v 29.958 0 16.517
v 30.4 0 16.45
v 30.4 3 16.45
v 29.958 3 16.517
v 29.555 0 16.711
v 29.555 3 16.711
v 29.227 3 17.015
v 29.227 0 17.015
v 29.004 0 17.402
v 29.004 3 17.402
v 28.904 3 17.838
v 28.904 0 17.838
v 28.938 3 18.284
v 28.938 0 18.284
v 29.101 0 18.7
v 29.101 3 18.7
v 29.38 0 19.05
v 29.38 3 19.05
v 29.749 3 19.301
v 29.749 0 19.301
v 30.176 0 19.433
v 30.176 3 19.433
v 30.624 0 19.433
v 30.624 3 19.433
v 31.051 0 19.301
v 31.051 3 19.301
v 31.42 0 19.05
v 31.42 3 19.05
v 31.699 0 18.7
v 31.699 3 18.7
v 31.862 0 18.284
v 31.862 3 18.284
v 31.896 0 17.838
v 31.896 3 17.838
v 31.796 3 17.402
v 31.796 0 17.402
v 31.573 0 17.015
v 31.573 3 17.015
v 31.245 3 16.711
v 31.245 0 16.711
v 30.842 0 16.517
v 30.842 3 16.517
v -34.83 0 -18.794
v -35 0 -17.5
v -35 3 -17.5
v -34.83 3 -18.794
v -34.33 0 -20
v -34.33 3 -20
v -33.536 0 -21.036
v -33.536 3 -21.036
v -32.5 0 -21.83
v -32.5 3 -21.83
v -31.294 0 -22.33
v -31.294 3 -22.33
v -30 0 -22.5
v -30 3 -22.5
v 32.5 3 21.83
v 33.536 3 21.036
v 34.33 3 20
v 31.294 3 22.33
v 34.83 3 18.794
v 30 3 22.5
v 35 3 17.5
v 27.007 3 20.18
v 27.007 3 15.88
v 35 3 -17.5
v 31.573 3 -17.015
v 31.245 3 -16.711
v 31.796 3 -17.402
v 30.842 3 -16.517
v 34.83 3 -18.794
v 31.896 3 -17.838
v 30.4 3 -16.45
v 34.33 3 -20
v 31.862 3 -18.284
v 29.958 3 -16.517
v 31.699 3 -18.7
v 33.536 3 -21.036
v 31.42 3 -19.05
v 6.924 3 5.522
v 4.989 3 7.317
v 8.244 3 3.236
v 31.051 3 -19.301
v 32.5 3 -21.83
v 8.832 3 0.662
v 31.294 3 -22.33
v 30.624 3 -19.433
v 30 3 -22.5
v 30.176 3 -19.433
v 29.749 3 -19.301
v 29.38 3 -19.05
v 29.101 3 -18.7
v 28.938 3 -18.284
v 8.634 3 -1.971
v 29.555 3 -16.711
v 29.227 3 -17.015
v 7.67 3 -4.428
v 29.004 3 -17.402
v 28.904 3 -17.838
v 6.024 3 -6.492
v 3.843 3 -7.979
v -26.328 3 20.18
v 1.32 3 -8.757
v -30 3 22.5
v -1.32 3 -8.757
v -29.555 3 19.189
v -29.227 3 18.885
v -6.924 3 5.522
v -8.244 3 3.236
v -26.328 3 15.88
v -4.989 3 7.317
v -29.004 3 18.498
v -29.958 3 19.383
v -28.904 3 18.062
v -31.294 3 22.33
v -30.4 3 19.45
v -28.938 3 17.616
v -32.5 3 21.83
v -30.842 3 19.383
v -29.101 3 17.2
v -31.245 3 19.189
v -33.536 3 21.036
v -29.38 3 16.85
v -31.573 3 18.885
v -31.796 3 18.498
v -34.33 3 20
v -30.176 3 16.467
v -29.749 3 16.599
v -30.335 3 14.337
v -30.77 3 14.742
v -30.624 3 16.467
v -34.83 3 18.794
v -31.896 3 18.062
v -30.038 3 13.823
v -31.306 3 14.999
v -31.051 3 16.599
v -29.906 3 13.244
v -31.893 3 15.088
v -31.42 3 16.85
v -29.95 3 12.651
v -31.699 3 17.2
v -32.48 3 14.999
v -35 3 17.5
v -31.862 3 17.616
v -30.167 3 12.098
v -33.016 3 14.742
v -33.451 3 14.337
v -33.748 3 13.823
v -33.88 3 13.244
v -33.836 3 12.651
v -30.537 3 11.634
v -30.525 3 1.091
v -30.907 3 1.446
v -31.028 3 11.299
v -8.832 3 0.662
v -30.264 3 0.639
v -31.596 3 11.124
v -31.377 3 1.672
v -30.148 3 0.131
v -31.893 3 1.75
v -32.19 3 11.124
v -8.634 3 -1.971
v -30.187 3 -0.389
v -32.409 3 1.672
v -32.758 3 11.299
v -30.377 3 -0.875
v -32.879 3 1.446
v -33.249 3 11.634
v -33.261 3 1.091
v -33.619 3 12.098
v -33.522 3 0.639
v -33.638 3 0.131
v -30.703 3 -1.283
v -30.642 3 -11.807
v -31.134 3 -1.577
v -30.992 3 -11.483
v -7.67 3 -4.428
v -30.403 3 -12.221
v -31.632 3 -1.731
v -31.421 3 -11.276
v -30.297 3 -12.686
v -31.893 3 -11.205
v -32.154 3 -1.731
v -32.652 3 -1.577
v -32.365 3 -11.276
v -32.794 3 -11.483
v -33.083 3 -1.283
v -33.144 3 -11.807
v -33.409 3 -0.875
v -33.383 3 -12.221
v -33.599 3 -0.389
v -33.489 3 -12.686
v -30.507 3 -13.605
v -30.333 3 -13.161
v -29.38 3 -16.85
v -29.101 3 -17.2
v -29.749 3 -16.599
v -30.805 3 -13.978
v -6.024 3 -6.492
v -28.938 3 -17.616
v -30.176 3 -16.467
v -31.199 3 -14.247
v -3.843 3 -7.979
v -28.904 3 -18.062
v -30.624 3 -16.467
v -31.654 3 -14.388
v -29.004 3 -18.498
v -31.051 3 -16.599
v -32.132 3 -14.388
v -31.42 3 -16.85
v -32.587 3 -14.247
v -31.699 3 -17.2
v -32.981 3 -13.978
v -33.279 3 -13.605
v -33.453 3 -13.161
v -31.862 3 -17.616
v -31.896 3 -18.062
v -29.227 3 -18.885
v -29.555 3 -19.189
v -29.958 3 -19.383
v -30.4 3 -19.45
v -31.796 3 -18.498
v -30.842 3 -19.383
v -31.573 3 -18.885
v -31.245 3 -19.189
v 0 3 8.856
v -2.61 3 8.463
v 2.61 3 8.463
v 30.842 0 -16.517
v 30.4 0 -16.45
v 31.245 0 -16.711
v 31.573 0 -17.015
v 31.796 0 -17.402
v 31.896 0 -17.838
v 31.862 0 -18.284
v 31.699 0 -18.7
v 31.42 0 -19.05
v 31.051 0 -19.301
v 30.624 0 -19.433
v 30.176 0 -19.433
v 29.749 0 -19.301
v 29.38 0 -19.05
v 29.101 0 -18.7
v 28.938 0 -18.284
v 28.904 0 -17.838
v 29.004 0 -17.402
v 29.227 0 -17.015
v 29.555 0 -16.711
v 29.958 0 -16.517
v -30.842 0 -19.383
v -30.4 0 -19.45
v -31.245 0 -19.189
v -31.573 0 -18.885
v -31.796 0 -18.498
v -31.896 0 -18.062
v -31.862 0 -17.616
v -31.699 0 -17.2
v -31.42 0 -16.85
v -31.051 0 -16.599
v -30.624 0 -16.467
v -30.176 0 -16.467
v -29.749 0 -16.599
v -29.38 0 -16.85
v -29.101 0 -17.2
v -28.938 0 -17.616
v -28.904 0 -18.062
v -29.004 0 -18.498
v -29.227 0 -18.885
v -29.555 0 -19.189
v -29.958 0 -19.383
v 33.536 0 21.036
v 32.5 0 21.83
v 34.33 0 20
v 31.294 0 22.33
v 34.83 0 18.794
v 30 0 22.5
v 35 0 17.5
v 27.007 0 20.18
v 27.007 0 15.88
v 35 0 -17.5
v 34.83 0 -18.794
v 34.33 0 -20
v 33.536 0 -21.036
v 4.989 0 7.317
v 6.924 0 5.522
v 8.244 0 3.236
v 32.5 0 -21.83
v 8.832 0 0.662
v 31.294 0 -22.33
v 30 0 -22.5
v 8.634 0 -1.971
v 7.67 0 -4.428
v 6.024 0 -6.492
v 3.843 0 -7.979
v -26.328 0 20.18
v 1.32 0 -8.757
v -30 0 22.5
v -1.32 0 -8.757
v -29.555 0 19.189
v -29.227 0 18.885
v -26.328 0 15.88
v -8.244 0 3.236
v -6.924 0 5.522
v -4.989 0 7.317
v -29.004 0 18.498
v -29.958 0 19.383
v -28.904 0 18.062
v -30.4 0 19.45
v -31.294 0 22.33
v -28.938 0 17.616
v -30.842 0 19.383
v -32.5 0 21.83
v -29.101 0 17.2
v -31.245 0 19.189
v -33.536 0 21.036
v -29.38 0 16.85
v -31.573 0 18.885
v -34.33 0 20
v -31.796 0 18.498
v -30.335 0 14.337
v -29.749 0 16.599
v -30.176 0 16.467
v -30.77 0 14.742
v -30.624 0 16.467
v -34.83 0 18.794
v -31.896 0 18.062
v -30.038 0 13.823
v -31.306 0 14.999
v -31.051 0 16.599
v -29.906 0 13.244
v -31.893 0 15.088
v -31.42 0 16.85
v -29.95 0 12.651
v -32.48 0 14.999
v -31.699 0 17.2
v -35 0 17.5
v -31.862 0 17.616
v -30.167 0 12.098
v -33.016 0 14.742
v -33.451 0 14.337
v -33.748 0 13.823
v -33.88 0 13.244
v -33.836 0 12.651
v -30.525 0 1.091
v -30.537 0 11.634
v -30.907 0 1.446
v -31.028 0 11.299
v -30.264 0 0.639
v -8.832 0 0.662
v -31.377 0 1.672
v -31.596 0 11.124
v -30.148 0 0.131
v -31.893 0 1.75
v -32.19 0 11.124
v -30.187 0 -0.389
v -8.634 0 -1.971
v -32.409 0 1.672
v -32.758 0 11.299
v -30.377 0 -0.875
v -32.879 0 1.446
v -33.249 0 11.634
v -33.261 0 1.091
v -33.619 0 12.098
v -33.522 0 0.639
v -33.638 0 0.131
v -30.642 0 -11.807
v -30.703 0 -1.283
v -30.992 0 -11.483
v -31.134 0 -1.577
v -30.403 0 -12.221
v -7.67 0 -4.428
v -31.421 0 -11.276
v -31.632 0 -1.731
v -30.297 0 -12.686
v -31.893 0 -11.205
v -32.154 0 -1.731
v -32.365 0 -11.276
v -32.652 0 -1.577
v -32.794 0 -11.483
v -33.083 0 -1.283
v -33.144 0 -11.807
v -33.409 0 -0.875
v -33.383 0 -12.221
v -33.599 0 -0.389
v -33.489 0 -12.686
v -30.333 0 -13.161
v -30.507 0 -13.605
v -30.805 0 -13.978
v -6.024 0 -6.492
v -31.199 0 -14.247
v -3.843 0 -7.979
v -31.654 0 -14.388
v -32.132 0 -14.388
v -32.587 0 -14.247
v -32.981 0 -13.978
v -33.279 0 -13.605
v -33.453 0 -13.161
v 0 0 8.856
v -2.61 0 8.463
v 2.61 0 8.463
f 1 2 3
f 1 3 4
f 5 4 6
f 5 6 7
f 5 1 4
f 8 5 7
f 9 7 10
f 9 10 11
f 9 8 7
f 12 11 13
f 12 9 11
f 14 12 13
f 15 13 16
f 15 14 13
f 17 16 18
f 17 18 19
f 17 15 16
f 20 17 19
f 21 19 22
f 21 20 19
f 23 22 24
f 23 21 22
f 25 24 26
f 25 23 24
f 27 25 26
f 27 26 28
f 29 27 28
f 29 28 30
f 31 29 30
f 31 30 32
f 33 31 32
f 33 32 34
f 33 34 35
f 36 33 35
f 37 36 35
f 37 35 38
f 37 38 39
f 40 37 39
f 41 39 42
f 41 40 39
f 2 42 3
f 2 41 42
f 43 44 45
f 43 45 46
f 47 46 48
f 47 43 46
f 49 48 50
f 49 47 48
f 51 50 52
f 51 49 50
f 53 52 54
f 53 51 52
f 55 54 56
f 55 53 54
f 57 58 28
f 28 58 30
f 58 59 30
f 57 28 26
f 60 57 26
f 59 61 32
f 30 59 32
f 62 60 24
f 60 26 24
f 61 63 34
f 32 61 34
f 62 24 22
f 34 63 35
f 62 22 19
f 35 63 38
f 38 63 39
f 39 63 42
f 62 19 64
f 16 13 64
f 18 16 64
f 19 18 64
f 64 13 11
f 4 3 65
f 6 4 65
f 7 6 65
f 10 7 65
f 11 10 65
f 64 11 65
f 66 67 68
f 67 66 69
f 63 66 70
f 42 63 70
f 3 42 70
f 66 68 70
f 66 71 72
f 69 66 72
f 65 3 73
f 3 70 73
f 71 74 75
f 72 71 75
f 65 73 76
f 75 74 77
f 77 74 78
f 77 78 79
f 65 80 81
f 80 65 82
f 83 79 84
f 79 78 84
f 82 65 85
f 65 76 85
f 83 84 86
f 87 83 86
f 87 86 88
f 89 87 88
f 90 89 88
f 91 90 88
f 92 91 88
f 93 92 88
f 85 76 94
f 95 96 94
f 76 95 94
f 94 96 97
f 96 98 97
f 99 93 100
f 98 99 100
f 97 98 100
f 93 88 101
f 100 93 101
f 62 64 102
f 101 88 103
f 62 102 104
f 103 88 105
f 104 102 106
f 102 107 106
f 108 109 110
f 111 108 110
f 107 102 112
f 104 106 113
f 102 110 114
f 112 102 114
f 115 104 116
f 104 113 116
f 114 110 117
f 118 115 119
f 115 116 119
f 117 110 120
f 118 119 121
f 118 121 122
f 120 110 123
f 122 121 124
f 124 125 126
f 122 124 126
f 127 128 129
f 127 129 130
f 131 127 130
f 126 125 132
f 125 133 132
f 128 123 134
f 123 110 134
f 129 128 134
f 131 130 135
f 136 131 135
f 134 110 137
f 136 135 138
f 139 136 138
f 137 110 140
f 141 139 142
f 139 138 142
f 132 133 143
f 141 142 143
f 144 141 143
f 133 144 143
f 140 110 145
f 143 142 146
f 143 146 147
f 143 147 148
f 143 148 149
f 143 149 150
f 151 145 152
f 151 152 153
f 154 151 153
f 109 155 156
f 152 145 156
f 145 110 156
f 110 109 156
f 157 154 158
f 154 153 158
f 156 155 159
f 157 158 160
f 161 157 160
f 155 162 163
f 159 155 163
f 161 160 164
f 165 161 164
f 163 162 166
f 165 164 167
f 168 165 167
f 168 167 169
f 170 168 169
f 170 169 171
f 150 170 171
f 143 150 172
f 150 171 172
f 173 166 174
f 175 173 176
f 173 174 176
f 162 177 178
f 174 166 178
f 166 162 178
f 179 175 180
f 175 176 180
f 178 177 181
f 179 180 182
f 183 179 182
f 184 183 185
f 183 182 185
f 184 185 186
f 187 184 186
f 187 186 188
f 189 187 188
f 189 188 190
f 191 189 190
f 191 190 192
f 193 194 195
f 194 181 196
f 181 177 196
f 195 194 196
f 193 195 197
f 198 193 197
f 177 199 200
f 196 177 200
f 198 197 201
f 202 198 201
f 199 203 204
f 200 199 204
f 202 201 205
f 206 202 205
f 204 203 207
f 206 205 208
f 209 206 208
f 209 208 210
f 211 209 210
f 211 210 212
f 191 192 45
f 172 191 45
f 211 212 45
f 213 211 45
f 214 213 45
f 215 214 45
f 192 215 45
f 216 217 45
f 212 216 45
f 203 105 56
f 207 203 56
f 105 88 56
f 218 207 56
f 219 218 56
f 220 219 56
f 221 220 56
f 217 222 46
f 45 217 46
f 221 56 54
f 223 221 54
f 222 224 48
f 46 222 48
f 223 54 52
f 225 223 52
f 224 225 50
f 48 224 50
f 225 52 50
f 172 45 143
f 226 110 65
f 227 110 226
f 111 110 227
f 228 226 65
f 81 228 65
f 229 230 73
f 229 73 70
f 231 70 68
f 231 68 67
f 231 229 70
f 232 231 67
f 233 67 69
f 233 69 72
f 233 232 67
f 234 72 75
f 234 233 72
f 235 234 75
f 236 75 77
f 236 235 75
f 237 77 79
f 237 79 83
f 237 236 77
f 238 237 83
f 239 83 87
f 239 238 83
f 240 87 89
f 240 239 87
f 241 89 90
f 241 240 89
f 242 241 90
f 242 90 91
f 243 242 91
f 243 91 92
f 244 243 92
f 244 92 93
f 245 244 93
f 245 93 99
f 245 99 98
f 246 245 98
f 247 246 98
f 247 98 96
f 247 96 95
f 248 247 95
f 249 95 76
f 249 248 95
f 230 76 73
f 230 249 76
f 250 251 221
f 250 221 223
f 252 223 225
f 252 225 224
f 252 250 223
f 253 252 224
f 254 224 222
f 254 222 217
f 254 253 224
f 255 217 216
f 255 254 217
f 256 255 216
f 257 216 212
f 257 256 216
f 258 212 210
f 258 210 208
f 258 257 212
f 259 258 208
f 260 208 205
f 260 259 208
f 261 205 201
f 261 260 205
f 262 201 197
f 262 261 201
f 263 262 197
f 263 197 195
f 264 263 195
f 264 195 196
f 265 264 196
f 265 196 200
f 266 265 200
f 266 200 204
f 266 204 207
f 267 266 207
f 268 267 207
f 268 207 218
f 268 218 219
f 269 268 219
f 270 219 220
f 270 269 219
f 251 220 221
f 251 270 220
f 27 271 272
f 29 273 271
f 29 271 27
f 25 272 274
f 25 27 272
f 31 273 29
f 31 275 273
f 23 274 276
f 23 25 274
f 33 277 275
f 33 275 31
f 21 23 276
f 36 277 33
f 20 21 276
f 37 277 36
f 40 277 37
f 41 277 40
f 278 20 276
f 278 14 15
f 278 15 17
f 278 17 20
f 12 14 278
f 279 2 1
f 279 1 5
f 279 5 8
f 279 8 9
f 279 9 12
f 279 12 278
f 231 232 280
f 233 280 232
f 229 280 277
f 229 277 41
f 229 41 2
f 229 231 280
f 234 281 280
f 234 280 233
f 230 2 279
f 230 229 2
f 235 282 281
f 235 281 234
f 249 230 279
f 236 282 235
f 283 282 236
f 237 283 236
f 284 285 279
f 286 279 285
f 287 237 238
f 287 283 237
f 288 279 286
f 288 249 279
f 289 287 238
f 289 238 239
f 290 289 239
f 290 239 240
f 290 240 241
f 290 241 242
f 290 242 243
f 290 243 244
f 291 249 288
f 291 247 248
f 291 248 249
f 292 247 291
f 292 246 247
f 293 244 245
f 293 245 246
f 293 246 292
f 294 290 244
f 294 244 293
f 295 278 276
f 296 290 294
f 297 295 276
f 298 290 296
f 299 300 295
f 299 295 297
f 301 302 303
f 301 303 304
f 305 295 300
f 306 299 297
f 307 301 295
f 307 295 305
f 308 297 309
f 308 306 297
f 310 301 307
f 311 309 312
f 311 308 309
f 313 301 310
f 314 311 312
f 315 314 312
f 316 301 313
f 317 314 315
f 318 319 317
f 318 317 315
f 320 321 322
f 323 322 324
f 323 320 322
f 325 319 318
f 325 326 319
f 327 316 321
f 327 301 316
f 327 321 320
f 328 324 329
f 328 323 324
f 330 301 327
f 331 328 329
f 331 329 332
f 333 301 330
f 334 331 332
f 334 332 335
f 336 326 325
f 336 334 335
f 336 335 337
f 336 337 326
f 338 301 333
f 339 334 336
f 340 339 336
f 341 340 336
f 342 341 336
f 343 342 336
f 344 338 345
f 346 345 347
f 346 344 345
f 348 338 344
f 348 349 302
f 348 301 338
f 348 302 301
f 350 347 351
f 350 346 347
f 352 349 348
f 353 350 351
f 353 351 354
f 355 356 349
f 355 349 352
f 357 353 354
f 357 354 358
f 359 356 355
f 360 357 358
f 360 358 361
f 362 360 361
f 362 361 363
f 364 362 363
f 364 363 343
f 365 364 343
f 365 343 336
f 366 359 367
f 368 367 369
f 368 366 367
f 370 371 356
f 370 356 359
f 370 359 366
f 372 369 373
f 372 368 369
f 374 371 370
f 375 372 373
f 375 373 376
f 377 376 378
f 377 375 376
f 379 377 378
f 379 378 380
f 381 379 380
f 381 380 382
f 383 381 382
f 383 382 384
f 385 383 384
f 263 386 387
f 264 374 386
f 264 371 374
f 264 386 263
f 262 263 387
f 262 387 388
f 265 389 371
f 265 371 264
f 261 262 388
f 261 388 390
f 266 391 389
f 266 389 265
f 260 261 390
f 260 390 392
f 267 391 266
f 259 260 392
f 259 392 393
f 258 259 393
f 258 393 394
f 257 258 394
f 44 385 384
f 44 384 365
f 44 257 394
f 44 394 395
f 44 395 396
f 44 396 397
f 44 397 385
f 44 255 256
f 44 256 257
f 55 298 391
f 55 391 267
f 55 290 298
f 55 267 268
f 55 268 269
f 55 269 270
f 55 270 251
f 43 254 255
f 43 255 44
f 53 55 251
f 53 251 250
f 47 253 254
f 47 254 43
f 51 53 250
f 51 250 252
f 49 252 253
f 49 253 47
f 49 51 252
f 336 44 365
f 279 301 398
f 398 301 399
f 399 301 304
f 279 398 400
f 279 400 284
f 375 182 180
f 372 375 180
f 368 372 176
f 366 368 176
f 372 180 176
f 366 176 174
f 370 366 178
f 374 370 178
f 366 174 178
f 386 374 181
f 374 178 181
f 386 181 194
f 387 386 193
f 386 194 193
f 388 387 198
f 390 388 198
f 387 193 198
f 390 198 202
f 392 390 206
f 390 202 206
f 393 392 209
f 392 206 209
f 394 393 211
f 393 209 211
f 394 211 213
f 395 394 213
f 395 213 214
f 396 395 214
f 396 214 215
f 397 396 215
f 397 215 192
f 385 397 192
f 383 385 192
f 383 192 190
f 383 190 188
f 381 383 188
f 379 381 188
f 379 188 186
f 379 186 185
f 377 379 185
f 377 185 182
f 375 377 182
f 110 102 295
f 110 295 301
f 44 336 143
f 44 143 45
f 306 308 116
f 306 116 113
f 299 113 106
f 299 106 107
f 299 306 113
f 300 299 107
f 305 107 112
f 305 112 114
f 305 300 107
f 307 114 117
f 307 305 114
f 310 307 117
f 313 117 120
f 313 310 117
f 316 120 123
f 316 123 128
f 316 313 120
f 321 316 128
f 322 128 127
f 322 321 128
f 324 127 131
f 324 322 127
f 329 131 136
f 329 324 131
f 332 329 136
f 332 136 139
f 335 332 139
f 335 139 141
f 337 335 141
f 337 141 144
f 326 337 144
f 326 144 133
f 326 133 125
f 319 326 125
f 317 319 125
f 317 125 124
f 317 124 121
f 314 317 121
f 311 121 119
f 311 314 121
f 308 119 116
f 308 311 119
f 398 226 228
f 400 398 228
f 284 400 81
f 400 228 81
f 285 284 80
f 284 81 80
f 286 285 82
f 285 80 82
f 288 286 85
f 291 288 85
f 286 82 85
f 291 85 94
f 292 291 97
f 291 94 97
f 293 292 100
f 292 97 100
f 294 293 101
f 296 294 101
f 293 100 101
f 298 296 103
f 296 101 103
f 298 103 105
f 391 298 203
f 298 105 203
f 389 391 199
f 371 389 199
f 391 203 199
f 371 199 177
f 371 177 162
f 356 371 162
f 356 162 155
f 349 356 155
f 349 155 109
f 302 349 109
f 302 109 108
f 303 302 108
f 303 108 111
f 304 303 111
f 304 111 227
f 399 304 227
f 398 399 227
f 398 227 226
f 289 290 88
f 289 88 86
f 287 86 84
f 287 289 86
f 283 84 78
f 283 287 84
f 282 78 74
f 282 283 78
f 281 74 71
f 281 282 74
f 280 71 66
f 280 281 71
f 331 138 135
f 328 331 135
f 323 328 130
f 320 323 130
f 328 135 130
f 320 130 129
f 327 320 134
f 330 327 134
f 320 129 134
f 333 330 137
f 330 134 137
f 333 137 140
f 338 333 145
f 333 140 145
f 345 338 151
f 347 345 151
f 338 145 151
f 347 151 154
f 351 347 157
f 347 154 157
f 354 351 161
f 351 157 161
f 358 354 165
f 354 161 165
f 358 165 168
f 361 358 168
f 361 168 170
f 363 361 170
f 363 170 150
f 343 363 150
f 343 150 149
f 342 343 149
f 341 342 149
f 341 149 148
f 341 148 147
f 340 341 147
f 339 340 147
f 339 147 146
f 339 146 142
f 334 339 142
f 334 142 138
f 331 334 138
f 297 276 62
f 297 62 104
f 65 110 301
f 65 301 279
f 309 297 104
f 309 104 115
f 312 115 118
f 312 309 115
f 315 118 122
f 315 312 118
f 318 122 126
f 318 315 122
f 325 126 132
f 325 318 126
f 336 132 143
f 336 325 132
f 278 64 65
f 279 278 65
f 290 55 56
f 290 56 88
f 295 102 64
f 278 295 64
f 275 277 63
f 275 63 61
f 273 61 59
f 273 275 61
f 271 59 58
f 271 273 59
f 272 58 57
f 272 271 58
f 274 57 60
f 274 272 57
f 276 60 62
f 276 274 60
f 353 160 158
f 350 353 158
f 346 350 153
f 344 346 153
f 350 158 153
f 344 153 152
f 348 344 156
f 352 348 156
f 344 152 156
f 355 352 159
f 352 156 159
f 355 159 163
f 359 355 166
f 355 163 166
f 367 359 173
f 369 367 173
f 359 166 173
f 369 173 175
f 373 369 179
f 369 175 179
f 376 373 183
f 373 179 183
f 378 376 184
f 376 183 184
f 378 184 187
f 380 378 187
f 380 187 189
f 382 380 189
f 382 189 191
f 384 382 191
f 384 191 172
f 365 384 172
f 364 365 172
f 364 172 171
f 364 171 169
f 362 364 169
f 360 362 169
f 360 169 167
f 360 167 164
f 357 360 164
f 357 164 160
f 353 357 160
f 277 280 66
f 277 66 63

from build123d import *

# Parameters (mm, degrees)
SKETCH_1_R          = 1.5
EXTRUDE_1_DEPTH     = 3
SKETCH_2_R          = 8.856274186
SKETCH_2_R_2        = 1.600284684
SKETCH_2_R_3        = 1.750181187
SKETCH_2_R_4        = 1.993052337
SKETCH_2_W          = 53.334767433
SKETCH_2_H          = 4.299974178
CUT_EXTRUDE_1_DEPTH = 42.716303767


with BuildPart() as part:
    # 草图1 → 凸台-拉伸1 (new body)
    with BuildSketch(Plane(origin=(0, 0, 0), x_dir=(1, 0, 0), z_dir=(0, 1, 0))):
        with BuildLine():
            Line((-30, 22.5), (30, 22.5))
            ThreePointArc((30, 22.5), (33.535533906, 21.035533906), (35, 17.5))
            Line((35, 17.5), (35, -17.5))
            ThreePointArc((35, -17.5), (33.535533906, -21.035533906), (30, -22.5))
            Line((30, -22.5), (-30, -22.5))
            ThreePointArc((-30, -22.5), (-33.535533906, -21.035533906), (-35, -17.5))
            Line((-35, -17.5), (-35, 17.5))
            ThreePointArc((-35, 17.5), (-33.535533906, 21.035533906), (-30, 22.5))
        make_face()
        with Locations(Location((-30.4, -17.95, 0), (0, 0, 270))):
            Circle(SKETCH_1_R, mode=Mode.SUBTRACT)
        with Locations(Location((30.4, -17.95, 0), (0, 0, 90))):
            Circle(SKETCH_1_R, mode=Mode.SUBTRACT)
        with Locations(Location((30.4, 17.95, 0), (0, 0, 270))):
            Circle(SKETCH_1_R, mode=Mode.SUBTRACT)
        with Locations(Location((-30.4, 17.95, 0), (0, 0, 90))):
            Circle(SKETCH_1_R, mode=Mode.SUBTRACT)
    extrude(amount=EXTRUDE_1_DEPTH)

    # 草图2 → 切除-拉伸1 (cut, through all)
    with BuildSketch(Plane(origin=(0, 3, 0), x_dir=(1, 0, 0), z_dir=(0, 1, 0))):
        with Locations(Location((0, 0, 0), (0, 0, 270))):
            Circle(SKETCH_2_R)
        with Locations(Location((-31.892993618, 12.805189582, 0), (0, 0, 270))):
            Circle(SKETCH_2_R_2)
        with Locations(Location((-31.892993618, 0, 0), (0, 0, 270))):
            Circle(SKETCH_2_R_3)
        with Locations(Location((-31.892993618, -13.094810418, 0), (0, 0, 270))):
            Circle(SKETCH_2_R_4)
        with Locations((0.339471646, -18.029716289)):
            Rectangle(SKETCH_2_W, SKETCH_2_H)
    extrude(amount=-CUT_EXTRUDE_1_DEPTH, mode=Mode.SUBTRACT)


solid = part.part
